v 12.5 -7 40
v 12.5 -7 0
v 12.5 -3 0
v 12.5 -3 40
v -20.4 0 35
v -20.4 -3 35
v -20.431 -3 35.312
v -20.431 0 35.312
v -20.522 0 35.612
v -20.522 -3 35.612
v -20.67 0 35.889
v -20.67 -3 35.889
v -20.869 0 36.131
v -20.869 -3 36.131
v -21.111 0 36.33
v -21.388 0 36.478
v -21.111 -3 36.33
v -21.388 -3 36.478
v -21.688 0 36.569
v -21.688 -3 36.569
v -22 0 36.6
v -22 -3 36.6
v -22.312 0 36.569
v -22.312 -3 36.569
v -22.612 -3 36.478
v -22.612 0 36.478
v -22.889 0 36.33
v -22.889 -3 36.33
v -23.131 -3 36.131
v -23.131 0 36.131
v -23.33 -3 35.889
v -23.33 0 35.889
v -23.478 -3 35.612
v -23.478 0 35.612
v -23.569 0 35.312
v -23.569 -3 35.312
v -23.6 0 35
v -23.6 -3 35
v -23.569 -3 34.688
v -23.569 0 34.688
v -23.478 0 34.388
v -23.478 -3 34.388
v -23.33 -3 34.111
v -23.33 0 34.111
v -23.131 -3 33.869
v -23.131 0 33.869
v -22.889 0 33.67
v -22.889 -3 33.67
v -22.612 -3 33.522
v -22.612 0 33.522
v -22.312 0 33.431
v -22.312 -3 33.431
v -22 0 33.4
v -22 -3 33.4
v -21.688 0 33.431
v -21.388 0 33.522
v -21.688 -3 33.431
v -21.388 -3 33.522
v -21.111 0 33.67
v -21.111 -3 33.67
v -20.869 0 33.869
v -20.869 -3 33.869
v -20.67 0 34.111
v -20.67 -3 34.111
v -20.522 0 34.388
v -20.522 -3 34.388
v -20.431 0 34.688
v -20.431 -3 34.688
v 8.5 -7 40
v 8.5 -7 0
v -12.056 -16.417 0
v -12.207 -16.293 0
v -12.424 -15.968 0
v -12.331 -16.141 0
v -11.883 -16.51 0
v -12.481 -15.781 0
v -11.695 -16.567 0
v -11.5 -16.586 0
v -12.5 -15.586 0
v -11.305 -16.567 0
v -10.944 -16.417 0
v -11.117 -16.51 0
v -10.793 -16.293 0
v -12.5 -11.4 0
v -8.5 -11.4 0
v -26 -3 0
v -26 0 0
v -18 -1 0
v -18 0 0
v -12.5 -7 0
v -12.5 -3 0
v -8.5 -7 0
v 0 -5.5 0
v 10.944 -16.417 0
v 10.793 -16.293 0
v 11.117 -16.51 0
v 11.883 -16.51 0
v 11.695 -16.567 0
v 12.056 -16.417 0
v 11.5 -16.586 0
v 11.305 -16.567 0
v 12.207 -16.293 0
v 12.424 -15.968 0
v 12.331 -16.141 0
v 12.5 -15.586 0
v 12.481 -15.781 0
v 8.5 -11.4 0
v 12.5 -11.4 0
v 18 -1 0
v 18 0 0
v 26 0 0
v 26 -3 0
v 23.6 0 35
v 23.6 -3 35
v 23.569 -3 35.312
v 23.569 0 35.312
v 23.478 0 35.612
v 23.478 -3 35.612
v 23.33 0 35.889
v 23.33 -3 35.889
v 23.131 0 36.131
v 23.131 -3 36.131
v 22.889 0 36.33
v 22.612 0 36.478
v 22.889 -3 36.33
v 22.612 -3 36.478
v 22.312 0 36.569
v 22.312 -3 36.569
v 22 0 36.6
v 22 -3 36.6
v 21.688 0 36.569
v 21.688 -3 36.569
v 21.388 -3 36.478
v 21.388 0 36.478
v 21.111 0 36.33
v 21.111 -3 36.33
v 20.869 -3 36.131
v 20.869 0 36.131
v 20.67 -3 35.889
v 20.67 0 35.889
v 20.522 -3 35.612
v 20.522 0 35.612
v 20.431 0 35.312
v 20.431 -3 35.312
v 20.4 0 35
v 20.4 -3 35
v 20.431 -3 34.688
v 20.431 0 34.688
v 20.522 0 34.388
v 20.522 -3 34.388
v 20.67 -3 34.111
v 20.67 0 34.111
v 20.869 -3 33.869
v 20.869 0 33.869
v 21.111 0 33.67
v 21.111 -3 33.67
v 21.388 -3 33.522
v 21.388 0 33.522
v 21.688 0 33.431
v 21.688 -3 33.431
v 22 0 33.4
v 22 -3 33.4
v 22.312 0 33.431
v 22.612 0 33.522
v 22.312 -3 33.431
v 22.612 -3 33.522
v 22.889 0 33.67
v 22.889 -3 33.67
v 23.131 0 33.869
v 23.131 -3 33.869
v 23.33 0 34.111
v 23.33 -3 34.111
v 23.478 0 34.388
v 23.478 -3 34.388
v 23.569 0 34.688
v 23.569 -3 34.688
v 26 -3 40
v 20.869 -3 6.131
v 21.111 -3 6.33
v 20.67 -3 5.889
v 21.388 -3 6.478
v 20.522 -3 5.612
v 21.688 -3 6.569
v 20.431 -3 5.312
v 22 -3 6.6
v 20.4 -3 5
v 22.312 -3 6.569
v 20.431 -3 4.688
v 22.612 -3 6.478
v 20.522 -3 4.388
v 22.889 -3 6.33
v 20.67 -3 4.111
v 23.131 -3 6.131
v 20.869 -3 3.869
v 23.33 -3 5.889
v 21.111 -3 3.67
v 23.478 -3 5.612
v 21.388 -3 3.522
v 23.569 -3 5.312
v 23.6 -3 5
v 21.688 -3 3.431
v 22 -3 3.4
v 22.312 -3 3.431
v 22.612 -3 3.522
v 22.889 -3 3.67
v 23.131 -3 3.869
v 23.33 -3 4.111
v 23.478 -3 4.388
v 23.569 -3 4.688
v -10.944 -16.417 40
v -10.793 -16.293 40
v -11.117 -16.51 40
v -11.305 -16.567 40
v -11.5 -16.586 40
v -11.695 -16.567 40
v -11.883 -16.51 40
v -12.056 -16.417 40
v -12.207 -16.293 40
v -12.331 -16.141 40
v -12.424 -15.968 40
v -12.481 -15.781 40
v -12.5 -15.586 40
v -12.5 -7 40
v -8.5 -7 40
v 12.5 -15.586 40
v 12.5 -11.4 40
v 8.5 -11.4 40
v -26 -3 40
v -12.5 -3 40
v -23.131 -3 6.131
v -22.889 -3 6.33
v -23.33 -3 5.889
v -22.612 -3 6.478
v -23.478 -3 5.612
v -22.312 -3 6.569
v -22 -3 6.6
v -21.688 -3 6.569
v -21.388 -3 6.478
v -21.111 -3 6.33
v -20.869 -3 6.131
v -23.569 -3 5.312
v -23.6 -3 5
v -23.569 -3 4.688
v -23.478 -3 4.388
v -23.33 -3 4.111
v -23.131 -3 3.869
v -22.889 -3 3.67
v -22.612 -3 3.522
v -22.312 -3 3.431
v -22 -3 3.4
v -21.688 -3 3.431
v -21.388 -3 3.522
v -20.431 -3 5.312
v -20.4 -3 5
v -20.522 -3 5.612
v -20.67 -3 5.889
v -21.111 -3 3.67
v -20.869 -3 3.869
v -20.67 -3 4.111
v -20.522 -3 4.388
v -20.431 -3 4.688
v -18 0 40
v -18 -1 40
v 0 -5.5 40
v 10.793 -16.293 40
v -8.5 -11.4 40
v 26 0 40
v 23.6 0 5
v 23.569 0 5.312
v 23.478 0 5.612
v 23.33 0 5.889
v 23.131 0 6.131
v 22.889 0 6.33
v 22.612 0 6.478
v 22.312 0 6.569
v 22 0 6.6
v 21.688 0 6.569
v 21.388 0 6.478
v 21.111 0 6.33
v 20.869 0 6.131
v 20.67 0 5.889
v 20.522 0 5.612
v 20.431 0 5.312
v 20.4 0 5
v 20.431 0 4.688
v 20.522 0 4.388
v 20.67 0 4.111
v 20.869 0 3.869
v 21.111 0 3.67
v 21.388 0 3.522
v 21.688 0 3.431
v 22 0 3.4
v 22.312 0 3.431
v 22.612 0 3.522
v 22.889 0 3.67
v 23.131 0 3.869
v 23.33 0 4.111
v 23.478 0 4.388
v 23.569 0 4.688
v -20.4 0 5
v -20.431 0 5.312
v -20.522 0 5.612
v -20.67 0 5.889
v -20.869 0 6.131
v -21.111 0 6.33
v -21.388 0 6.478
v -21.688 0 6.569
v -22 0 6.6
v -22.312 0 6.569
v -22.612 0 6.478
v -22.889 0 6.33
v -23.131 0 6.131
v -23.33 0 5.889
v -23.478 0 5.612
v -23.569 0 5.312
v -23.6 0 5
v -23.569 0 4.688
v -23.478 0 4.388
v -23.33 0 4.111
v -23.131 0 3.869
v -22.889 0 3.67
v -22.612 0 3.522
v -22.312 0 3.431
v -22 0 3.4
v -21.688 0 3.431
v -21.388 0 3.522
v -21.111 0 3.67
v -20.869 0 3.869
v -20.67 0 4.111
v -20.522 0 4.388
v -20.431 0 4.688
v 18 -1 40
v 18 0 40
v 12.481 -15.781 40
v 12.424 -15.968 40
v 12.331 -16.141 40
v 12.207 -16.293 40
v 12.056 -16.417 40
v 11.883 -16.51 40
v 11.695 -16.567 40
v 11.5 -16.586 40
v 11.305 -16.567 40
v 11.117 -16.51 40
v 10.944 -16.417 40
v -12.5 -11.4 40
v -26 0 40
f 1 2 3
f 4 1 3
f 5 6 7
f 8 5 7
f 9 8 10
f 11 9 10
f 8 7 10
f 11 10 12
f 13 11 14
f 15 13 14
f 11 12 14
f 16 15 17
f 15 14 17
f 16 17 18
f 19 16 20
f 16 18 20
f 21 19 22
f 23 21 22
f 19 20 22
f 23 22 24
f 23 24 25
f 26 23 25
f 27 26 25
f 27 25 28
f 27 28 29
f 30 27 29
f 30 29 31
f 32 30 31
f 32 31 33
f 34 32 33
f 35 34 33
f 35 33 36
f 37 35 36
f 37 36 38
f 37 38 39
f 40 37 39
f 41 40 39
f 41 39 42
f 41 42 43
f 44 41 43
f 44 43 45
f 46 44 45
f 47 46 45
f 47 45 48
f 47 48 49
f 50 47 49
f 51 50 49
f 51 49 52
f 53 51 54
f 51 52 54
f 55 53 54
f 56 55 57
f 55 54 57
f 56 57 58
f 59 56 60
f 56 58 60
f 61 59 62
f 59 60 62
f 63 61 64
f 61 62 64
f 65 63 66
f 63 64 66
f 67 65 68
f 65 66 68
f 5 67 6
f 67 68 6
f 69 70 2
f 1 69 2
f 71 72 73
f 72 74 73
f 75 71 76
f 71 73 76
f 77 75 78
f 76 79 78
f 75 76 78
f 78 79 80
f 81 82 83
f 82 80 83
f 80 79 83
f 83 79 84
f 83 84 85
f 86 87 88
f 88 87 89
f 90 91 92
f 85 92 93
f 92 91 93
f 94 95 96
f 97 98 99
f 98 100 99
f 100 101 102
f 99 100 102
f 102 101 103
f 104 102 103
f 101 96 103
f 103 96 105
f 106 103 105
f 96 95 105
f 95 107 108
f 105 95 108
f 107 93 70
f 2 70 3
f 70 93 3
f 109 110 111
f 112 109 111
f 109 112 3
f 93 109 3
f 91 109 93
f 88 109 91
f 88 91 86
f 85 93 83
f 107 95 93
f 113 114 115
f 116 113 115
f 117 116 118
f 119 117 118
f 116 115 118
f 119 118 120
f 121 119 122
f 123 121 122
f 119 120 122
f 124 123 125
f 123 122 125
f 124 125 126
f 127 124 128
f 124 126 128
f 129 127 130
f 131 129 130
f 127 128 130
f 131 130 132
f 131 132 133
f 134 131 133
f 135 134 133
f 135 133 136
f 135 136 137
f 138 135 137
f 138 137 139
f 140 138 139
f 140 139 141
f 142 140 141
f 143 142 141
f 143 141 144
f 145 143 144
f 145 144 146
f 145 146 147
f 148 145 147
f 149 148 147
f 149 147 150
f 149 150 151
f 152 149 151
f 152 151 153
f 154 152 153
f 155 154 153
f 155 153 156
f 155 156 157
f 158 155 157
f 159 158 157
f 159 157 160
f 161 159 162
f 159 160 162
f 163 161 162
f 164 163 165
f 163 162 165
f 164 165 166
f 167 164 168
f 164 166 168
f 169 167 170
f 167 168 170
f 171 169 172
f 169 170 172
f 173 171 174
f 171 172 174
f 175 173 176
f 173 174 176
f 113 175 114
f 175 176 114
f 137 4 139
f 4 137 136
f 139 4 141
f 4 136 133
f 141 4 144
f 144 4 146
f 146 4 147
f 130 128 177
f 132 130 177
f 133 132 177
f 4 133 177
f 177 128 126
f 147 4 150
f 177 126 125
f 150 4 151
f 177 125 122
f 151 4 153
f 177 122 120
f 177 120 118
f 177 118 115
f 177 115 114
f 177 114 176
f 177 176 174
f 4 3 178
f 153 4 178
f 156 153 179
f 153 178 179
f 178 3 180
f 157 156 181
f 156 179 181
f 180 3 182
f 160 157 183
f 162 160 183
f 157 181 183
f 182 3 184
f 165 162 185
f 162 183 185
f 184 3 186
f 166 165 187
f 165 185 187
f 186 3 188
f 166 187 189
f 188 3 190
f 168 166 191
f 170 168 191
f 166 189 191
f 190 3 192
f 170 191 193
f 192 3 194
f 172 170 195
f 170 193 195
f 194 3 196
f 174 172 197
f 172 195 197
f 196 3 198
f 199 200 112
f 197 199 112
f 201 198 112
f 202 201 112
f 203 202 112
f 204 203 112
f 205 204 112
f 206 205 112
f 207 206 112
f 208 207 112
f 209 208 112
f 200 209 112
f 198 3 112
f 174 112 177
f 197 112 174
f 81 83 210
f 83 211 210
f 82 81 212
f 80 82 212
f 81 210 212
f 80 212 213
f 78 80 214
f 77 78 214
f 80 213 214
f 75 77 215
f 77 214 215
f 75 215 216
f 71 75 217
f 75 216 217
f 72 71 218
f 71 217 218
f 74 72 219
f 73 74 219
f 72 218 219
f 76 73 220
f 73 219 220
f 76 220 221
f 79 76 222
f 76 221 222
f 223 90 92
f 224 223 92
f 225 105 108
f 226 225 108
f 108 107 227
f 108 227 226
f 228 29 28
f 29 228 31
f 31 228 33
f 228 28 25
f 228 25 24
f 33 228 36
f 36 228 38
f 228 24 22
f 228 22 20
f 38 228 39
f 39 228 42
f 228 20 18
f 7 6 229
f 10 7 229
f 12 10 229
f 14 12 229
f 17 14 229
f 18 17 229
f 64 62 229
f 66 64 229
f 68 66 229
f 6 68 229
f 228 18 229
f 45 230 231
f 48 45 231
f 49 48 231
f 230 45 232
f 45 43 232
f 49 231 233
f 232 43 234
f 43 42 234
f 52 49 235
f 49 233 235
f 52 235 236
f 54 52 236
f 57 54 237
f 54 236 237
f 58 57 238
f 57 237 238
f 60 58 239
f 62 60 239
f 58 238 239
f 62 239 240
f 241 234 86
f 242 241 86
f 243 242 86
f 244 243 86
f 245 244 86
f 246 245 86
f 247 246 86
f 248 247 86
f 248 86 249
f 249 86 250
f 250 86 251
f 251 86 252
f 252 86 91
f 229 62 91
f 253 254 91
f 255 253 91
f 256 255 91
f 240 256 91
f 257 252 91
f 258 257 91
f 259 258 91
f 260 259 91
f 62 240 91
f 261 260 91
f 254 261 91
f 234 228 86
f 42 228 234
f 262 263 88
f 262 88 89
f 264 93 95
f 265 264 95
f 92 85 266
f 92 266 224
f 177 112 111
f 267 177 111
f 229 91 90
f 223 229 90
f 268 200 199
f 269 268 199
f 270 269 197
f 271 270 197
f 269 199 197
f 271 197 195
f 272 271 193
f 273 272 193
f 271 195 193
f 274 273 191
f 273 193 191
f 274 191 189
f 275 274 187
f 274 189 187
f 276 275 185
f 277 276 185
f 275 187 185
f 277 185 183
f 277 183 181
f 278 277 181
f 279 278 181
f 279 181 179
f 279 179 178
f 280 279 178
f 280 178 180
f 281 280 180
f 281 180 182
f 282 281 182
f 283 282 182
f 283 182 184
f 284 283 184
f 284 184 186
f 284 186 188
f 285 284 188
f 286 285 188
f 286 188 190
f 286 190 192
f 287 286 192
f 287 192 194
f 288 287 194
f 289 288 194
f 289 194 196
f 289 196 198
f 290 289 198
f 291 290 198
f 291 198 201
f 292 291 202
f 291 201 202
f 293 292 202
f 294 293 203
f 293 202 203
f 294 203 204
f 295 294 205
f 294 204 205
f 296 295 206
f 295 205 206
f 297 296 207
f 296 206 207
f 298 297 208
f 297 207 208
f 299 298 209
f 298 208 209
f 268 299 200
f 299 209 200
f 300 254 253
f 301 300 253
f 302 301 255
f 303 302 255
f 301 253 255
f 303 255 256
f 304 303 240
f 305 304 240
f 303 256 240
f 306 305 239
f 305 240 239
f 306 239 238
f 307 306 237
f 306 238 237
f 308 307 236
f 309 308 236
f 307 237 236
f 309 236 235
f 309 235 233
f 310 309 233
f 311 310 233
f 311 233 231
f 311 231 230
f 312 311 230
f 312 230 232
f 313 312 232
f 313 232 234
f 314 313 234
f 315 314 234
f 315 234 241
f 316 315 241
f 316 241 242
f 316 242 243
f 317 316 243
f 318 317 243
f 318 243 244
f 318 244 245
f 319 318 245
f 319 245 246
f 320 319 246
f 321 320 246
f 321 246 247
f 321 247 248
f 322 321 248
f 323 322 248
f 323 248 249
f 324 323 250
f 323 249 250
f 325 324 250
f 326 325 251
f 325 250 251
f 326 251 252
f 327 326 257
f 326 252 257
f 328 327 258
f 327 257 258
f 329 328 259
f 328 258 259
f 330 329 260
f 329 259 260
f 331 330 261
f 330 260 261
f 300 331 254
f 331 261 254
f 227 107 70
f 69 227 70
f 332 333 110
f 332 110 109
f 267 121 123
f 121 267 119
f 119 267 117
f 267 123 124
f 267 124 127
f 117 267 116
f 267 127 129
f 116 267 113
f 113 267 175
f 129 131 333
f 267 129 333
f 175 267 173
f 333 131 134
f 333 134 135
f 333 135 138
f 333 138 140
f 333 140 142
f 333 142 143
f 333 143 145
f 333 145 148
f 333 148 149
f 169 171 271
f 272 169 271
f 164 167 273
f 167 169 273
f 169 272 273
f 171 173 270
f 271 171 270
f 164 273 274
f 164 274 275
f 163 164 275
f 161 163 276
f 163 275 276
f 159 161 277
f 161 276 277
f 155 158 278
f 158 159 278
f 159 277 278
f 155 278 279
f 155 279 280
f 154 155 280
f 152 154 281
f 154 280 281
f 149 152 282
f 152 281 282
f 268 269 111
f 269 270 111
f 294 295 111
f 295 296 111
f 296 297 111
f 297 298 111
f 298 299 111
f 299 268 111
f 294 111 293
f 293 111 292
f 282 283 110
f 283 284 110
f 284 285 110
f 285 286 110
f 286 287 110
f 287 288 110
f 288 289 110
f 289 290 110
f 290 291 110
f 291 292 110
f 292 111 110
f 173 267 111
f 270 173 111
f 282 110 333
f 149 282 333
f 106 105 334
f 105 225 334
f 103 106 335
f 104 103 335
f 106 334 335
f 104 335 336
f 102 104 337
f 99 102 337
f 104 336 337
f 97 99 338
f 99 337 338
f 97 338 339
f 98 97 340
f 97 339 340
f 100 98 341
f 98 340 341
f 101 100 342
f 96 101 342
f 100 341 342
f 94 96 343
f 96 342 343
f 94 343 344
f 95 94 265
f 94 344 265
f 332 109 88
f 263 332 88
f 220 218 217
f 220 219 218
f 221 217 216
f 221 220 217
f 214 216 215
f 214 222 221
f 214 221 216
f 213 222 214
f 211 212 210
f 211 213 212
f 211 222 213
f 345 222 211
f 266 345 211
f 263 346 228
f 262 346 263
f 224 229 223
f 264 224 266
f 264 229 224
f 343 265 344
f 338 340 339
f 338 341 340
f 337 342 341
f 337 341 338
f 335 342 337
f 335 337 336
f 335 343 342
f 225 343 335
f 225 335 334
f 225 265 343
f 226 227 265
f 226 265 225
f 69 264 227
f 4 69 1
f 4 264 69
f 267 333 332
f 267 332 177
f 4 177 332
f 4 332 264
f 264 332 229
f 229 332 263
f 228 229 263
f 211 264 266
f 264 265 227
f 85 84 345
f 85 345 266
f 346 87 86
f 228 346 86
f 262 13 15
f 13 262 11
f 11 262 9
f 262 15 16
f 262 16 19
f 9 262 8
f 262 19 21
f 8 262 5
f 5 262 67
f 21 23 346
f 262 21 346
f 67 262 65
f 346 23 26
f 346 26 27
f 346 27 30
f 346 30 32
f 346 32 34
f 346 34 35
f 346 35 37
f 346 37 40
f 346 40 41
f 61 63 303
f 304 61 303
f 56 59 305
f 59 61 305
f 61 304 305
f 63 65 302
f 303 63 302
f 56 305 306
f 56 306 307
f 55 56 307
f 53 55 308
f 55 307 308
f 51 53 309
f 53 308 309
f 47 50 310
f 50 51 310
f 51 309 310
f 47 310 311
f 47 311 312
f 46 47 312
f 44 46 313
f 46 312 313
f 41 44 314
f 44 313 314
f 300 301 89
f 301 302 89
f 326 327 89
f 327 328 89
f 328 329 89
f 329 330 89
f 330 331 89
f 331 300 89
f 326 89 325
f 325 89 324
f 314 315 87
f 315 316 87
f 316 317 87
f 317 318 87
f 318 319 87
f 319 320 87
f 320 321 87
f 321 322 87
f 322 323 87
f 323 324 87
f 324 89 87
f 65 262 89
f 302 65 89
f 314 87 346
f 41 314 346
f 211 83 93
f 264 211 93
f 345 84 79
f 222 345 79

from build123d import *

# Parameters (mm, degrees)
PAD_DEPTH         = 40
SKETCH001_W       = 4
SKETCH001_H       = 4.4
POCKET_DEPTH      = 0.001
POCKET_DEPTH_BACK = -40.001
FILLET_R          = 1
SKETCH002_R       = 1.6
POCKET001_DEPTH   = 3.001


with BuildPart() as part:
    # Sketch → Pad (new body)
    with BuildSketch(Plane.XY):
        Polygon((-12.5, -3), (-12.5, -18), (0, -5.5), (12.5, -18), (12.5, -3), (26, -3), (26, 0), (18, 0), (18, -1), (-18, -1), (-18, 0), (-26, 0), (-26, -3), align=None)
    extrude(amount=PAD_DEPTH)

    # Sketch001 → Pocket (cut, two sides)
    with BuildSketch(Plane.XY) as pocket_sk:
        with Locations((-10.5, -9.2)):
            Rectangle(SKETCH001_W, SKETCH001_H)
        with Locations((10.5, -9.2)):
            Rectangle(SKETCH001_W, SKETCH001_H)
    extrude(amount=-POCKET_DEPTH, mode=Mode.SUBTRACT)
    extrude(pocket_sk.sketch, amount=-POCKET_DEPTH_BACK, mode=Mode.SUBTRACT)

    # Fillet
    fillet_edges = [part.edges().sort_by_distance(p)[0] for p in [
        (-12.5, -18, 20),
        (12.5, -18, 20),
    ]]
    fillet(fillet_edges, radius=FILLET_R)

    # Sketch002 (on Face12 of Fillet) → Pocket001 (cut, through all)
    with BuildSketch(Plane.XZ.offset(3)):
        with Locations((-22, 5)):
            Circle(SKETCH002_R)
        with Locations((-22, 35)):
            Circle(SKETCH002_R)
        with Locations((22, 35)):
            Circle(SKETCH002_R)
        with Locations((22, 5)):
            Circle(SKETCH002_R)
    extrude(amount=-POCKET001_DEPTH, mode=Mode.SUBTRACT)


solid = part.part
